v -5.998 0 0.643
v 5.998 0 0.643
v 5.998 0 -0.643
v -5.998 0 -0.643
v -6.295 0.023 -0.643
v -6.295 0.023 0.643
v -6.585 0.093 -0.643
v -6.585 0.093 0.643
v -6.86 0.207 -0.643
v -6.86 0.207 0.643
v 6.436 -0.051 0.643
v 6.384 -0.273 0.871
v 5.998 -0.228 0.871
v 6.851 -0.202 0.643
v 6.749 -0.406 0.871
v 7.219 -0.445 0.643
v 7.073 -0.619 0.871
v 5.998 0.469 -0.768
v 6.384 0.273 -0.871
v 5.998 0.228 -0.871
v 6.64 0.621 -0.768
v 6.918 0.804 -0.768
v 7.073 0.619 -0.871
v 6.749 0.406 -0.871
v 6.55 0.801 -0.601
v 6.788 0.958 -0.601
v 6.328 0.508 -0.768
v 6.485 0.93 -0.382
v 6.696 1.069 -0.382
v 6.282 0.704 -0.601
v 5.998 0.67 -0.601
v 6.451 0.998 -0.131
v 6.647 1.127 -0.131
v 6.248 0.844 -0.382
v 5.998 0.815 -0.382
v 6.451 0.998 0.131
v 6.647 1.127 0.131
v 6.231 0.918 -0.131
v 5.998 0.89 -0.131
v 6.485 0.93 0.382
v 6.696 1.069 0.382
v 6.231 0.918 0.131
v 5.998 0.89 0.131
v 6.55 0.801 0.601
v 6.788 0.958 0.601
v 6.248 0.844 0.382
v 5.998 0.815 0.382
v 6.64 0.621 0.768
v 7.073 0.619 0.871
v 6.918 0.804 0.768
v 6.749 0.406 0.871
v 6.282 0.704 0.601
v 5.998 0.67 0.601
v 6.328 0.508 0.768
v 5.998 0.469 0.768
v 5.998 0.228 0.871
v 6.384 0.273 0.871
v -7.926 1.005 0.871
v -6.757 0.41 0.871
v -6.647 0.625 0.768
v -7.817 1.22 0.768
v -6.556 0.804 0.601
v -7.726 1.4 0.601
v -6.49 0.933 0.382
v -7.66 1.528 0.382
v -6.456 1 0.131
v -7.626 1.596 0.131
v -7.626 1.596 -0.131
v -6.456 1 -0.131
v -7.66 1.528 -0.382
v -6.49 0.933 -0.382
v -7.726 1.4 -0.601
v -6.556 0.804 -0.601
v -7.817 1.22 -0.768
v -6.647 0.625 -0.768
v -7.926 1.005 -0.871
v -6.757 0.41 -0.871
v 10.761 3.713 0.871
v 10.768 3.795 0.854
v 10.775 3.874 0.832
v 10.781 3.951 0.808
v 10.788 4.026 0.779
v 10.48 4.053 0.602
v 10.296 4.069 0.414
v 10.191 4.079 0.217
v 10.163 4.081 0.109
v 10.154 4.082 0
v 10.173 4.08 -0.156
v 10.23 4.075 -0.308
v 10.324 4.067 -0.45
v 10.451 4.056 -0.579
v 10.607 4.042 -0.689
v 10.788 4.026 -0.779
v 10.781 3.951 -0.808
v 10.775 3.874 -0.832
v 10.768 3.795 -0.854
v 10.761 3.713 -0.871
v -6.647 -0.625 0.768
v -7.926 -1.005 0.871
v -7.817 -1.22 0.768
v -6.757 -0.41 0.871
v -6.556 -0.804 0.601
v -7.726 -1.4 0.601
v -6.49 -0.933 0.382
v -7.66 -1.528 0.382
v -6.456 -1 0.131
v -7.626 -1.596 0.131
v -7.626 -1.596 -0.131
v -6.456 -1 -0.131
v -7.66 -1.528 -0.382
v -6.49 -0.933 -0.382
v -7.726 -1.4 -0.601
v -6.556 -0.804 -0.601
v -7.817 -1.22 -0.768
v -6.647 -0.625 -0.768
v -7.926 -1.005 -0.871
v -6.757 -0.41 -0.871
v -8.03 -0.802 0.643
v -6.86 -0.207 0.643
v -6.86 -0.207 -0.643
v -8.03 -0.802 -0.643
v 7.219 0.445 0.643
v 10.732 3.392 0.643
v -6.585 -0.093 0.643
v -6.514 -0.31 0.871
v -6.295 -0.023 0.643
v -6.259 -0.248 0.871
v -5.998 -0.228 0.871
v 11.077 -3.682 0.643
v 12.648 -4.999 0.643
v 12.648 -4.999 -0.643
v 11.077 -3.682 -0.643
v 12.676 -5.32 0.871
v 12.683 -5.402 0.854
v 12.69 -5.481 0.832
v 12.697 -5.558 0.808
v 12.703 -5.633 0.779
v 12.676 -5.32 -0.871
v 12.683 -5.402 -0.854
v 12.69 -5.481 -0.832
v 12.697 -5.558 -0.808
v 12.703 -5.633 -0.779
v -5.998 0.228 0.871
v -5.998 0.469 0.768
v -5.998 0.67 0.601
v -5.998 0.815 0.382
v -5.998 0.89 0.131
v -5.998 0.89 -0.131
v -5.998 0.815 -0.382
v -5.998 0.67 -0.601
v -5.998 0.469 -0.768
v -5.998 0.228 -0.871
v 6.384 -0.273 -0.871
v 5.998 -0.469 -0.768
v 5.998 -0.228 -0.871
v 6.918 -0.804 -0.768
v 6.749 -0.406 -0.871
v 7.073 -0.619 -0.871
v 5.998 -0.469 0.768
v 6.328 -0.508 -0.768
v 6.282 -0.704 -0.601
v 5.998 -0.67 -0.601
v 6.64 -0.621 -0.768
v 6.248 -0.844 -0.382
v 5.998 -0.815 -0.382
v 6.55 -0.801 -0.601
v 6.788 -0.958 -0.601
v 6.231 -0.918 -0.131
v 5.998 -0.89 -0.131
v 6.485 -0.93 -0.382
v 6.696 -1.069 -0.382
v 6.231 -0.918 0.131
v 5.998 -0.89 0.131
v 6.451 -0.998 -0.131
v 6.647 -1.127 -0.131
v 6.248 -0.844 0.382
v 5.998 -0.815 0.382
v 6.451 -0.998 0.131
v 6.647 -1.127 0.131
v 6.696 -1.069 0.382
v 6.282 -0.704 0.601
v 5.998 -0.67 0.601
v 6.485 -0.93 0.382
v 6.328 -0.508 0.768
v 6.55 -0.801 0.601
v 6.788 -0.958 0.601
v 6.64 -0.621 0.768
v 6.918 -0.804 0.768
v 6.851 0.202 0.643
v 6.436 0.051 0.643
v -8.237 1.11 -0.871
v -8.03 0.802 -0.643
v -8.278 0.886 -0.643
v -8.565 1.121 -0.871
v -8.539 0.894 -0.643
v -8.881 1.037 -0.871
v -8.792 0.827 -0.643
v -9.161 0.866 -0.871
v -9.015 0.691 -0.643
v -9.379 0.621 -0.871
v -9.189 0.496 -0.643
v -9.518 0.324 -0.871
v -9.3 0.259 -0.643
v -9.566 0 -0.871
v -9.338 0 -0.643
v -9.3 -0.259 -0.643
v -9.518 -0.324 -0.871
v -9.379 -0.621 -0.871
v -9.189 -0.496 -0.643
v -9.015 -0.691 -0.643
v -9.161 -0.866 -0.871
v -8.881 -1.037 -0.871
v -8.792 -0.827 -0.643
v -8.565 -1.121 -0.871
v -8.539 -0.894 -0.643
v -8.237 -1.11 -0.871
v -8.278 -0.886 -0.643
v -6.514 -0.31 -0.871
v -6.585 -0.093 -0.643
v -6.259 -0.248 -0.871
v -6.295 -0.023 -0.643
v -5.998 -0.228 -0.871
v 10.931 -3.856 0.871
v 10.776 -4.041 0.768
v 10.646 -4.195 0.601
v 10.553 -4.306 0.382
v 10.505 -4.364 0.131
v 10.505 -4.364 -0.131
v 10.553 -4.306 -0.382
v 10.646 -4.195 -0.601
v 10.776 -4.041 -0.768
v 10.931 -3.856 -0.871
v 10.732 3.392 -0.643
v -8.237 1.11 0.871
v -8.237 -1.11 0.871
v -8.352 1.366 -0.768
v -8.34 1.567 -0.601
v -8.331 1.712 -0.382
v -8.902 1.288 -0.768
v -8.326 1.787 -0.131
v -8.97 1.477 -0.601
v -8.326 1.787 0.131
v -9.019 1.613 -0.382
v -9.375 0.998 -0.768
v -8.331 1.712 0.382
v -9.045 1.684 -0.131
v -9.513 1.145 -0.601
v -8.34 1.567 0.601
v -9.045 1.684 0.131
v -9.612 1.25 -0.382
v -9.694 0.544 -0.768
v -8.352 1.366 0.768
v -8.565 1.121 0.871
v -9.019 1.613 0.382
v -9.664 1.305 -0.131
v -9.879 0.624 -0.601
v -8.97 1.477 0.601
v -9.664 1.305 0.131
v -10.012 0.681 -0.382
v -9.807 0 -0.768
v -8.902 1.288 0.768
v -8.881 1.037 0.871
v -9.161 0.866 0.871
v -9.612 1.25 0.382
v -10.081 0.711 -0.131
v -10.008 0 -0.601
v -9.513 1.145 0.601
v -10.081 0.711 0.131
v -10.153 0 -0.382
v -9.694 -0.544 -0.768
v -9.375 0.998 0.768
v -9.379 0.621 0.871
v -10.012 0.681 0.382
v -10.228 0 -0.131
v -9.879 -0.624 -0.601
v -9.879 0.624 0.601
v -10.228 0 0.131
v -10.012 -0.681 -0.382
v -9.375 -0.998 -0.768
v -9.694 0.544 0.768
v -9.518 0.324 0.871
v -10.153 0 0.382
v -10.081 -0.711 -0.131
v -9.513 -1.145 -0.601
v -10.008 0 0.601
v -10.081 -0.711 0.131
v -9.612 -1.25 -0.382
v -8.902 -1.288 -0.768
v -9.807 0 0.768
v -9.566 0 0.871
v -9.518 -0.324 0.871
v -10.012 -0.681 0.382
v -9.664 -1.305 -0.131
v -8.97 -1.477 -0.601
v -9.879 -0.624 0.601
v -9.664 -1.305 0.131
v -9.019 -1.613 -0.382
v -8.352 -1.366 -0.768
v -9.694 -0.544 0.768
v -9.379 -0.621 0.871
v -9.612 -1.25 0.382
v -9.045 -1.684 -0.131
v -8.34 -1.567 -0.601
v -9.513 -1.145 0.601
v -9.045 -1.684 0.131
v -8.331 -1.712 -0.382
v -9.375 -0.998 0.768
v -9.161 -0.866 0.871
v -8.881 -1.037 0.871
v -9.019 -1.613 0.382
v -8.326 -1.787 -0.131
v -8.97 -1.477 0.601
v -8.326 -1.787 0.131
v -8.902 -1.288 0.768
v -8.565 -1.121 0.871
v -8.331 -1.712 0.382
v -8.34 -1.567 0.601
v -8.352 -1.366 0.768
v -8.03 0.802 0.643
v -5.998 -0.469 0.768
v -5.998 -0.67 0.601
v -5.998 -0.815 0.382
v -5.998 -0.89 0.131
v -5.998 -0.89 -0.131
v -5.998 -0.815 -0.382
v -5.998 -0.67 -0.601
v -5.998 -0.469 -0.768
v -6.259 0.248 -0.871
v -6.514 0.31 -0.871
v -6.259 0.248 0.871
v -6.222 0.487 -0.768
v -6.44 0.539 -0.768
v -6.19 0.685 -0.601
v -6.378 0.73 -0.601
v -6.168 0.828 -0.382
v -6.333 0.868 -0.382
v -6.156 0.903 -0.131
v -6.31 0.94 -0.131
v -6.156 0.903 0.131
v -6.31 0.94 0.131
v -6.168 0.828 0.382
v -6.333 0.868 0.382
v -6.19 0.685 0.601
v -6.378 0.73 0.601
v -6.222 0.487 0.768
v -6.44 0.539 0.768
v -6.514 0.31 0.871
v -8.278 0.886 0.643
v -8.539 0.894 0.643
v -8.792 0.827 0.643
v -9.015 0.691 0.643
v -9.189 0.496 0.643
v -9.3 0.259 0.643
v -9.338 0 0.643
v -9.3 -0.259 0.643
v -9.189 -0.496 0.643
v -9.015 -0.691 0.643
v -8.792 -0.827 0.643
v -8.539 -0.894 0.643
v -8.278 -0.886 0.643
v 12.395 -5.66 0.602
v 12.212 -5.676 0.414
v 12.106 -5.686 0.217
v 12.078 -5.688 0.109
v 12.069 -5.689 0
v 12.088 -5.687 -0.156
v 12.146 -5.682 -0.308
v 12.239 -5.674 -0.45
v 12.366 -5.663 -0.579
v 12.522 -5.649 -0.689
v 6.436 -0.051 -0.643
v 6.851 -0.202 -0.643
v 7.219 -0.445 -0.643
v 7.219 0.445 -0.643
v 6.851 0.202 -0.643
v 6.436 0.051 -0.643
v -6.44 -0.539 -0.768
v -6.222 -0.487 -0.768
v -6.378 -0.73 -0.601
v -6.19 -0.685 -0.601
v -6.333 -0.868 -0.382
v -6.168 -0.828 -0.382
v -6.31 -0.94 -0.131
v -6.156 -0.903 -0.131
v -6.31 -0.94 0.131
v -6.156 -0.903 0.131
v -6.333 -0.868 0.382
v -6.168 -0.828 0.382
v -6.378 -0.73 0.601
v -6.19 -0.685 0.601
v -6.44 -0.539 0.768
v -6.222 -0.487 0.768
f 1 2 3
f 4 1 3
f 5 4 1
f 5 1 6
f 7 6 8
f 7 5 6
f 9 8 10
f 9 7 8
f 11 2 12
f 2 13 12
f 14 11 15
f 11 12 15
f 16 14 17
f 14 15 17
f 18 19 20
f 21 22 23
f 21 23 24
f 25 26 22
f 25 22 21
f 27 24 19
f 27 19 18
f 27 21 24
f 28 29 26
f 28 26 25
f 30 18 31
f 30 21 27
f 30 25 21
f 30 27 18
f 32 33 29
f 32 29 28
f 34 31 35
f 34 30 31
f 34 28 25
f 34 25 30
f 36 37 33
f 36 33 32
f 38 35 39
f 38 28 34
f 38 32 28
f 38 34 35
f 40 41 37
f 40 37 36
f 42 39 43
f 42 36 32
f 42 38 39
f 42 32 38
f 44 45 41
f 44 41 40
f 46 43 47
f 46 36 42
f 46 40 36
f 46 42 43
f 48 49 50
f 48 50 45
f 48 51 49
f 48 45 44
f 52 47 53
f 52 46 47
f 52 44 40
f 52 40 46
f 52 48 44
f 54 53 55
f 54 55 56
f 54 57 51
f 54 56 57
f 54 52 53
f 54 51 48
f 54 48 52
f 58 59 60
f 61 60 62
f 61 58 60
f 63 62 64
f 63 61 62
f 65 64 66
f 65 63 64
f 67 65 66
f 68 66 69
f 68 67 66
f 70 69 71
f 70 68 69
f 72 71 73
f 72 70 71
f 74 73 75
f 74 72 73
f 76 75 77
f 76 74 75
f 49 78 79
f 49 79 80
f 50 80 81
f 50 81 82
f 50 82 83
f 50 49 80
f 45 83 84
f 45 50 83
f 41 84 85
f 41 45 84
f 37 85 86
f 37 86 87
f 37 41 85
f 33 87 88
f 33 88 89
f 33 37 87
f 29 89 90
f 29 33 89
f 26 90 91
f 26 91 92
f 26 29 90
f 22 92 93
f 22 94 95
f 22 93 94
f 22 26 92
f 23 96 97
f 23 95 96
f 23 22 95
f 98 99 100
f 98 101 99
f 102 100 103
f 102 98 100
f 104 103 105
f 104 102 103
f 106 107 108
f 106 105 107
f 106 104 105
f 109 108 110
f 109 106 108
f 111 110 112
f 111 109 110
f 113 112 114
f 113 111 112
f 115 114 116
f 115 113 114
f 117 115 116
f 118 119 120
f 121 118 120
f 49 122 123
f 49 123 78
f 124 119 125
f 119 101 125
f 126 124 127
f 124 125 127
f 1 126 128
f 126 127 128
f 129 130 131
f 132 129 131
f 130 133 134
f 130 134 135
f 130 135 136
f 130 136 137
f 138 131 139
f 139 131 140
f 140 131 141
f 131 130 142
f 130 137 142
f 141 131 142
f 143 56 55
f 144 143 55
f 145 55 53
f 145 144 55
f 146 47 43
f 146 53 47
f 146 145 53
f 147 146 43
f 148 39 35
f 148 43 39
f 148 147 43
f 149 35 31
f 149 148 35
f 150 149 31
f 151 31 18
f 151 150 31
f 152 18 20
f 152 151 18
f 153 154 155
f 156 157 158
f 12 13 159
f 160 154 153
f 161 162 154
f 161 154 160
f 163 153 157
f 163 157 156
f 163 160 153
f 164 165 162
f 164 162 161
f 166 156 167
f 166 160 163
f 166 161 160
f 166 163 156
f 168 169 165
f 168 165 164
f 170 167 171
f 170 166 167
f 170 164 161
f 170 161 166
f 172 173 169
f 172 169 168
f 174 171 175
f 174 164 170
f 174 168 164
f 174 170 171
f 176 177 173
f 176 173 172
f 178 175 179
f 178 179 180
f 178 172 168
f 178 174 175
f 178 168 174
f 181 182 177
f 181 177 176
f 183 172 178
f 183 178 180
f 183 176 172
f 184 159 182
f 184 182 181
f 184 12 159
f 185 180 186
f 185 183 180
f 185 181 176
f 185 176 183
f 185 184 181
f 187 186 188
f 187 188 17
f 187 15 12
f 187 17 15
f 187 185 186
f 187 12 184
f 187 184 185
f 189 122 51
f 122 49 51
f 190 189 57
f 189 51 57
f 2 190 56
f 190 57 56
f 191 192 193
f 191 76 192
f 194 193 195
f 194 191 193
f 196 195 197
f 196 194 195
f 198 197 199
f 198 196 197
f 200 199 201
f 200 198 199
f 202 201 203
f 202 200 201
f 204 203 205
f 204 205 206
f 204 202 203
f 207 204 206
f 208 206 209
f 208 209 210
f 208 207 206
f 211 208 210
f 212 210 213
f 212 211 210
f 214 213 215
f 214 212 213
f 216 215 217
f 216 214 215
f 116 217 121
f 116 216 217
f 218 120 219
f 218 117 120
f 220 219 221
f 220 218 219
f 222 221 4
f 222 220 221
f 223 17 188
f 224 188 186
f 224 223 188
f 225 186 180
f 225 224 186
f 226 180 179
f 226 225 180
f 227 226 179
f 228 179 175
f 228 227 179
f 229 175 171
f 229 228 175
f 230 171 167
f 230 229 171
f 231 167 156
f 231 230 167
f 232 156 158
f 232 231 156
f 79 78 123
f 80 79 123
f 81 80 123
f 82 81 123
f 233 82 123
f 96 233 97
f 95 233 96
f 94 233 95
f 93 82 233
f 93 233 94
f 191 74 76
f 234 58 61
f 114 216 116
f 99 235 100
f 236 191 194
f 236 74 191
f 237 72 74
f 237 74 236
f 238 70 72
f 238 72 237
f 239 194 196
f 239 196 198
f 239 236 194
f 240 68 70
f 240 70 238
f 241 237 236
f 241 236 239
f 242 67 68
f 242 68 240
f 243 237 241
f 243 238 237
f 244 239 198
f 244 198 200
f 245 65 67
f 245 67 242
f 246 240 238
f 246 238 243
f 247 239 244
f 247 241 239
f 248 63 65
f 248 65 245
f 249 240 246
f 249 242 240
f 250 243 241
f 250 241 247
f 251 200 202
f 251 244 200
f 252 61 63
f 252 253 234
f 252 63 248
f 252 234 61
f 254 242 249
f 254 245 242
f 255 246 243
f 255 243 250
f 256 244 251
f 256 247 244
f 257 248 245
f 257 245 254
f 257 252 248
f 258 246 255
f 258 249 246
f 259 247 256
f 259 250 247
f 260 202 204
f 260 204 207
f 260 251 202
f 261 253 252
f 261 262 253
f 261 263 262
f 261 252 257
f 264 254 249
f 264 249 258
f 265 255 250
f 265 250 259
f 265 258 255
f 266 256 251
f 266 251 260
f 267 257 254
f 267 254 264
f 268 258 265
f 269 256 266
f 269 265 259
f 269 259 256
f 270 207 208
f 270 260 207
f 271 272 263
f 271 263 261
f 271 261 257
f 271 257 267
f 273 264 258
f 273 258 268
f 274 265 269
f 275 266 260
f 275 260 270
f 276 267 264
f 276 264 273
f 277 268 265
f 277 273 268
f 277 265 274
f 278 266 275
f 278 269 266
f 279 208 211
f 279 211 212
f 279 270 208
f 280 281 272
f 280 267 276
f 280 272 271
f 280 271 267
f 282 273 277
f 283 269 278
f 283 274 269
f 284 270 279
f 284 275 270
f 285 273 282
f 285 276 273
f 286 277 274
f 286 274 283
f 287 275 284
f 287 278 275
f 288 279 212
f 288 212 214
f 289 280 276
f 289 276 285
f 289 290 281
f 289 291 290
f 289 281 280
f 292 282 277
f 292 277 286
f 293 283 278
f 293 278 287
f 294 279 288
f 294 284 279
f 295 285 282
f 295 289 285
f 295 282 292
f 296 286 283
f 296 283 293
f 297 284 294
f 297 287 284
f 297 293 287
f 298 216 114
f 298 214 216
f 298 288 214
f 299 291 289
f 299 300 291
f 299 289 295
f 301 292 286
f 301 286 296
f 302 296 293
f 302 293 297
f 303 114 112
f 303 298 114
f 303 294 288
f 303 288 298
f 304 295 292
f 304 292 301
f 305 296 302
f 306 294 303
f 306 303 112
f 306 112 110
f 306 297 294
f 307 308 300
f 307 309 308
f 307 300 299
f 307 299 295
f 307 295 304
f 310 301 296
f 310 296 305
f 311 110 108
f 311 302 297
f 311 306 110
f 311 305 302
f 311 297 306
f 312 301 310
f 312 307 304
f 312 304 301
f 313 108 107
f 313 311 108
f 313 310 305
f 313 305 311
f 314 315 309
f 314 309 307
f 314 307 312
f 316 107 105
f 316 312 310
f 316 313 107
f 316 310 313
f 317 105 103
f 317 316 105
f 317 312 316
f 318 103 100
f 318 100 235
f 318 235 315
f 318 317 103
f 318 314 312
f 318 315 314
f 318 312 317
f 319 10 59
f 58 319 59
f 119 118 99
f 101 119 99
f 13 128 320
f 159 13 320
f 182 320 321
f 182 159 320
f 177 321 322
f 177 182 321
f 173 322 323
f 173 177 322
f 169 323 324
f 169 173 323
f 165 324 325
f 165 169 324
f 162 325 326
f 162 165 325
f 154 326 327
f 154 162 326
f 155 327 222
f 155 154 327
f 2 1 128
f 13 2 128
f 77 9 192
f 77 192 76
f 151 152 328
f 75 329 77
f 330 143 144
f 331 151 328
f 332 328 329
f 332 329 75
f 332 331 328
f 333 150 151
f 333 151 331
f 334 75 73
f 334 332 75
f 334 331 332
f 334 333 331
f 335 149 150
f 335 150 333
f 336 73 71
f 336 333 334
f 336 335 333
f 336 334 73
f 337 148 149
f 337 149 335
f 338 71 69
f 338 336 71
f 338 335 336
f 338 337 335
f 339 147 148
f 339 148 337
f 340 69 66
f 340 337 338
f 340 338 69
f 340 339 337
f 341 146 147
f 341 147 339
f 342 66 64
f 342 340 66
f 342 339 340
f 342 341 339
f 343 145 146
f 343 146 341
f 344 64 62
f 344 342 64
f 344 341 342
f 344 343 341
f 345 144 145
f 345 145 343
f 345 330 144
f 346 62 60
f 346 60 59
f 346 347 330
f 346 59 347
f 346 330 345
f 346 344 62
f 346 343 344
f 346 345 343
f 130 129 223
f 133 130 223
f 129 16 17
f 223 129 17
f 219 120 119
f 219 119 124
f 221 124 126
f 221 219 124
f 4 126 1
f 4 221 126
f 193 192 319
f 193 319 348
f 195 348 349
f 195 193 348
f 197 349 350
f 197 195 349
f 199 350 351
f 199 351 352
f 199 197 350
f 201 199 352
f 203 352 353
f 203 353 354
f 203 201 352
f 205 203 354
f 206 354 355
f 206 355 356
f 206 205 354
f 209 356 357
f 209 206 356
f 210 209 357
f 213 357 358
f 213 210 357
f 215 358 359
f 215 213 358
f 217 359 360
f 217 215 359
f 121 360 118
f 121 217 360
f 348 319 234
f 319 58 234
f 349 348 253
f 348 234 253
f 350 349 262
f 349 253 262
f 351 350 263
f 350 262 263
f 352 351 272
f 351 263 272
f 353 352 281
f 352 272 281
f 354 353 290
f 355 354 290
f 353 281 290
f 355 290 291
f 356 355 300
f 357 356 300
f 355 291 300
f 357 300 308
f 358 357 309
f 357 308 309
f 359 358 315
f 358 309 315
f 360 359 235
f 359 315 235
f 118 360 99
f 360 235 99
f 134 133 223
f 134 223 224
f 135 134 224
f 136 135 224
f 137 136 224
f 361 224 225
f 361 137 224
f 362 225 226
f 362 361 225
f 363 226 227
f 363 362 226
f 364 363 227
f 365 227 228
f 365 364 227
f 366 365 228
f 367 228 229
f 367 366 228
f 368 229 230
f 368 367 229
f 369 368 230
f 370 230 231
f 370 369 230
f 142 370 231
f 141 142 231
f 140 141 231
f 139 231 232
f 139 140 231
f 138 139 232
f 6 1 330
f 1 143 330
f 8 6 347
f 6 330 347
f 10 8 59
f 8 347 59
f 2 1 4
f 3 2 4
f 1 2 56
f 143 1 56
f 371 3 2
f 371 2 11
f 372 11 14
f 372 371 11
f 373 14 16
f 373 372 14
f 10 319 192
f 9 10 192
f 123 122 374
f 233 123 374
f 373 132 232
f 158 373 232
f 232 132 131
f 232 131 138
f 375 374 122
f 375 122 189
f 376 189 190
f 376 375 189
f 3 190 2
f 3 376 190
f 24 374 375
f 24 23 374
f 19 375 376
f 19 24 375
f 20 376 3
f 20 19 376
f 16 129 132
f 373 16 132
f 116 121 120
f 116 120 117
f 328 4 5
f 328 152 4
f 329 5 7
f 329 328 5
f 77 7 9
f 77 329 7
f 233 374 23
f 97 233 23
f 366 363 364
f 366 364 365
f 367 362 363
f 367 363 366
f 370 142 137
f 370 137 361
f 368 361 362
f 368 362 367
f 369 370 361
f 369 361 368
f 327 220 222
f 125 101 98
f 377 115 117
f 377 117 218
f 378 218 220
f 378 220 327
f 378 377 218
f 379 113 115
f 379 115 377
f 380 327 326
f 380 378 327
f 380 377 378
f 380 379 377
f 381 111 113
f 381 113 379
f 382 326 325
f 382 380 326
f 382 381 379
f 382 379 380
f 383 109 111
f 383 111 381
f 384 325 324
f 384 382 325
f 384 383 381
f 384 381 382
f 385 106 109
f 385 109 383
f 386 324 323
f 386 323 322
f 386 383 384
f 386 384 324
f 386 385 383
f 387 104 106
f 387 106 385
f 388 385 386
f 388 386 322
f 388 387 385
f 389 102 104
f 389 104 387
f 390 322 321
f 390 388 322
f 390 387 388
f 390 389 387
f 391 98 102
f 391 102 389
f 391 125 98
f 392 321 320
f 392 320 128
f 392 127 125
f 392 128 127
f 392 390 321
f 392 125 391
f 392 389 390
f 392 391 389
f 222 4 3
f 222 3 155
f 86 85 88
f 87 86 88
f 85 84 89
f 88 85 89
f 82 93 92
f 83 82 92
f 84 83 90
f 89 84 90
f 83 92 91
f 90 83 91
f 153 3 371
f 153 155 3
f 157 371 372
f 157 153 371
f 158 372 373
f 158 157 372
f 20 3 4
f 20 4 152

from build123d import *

# Parameters (mm, degrees)
ZKOSIT1_SIZE                  = 0.257142857
ZKOSIT2_SIZE                  = 0.45
ODEBRAT_VYSUNUT_M2_DEPTH      = 10
ODEBRAT_VYSUNUT_M2_DEPTH_BACK = 10
ODEBRAT_VYSUNUT_M3_DEPTH      = 15.066370457
ODEBRAT_VYSUNUT_M3_DEPTH_BACK = 15.066370457


with BuildPart() as part:
    # Táhnout po křivce1: sweep along a path in Skica1
    with BuildLine(Plane.XY) as t_hnout_po_k_ivce1_path:
        Line((10.498702419, 4.371053092), (6.640879802, 1.133955557))
        ThreePointArc((6.640879802, 1.133955557), (6.340112335, 0.960307379), (5.998092192, 0.9))
        Line((5.998092192, 0.9), (-5.998092192, 0.9))
        ThreePointArc((-5.998092192, 0.9), (-6.231322977, 0.927578589), (-6.451689409, 1.008793198))
        Line((-6.451689409, 1.008793198), (-7.621462583, 1.604172244))
        ThreePointArc((-7.621462583, 1.604172244), (-10.237937574, 0), (-7.621462583, -1.604172244))
        Line((-7.621462583, -1.604172244), (-6.451689409, -1.008793198))
        ThreePointArc((-6.451689409, -1.008793198), (-6.231322977, -0.927578589), (-5.998092192, -0.9))
        Line((-5.998092192, -0.9), (5.998092192, -0.9))
        ThreePointArc((5.998092192, -0.9), (6.340112335, -0.960307379), (6.640879802, -1.133955557))
        Line((6.640879802, -1.133955557), (10.498702419, -4.371053092))
        Line((10.498702419, -4.371053092), (12.413813527, -5.978022117))
    # Skica2 → Táhnout po křivce1 (sweep)
    with BuildSketch(Plane(origin=(10.498702419, 4.371053092, 0), x_dir=(0, 0, -1), z_dir=(0.7660444431189762, 0.6427876096865417, 0))):
        with BuildLine():
            Line((0.9, -0.9), (-0.9, -0.9))
            ThreePointArc((-0.9, -0.9), (0, 0), (0.9, -0.9))
        make_face()
    sweep(path=t_hnout_po_k_ivce1_path.line)

    # Zkosit1
    # the kernel refuses this chamfer: 0.257142857 mm, written as the material it takes off along each edge
    with BuildSketch(Plane(origin=(5.998092192, 0, 0.9), x_dir=(0, 0, -1), z_dir=(-1, 0, 0)), Plane(origin=(-5.998092192, 0, 0.9), x_dir=(0, 0, -1), z_dir=(1, 0, 0))) as zkosit1_piece_1:
        with BuildLine():
            Line((ZKOSIT1_SIZE, 0), (0.029314045, -0.227828812))
            ThreePointArc((0.029314045, -0.227828812), (0.007766605, -0.117981219), (0, 0))
            Line((0, 0), (ZKOSIT1_SIZE, 0))
        make_face()
    extrude(amount=11.996184384, mode=Mode.SUBTRACT)
    with BuildSketch(Plane(origin=(5.998092192, 0, -0.9), x_dir=(0, 0, 1), z_dir=(-1, 0, 0)), Plane(origin=(-5.998092192, 0, -0.9), x_dir=(0, 0, 1), z_dir=(1, 0, 0))) as zkosit1_piece_2:
        with BuildLine():
            Line((ZKOSIT1_SIZE, 0), (0.029314045, 0.227828812))
            ThreePointArc((0.029314045, 0.227828812), (0.007766605, 0.117981219), (0, 0))
            Line((0, 0), (ZKOSIT1_SIZE, 0))
        make_face()
    extrude(amount=11.996184384, mode=Mode.SUBTRACT)
    with BuildSketch(Plane(origin=(-5.998092192, 1.9, 0.9), x_dir=(0, -1, 0), z_dir=(1, 0, 0))) as zkosit1_piece_3:
        with BuildLine():
            Line((1.9, ZKOSIT1_SIZE), (1.672171188, 0.029314045))
            ThreePointArc((1.672171188, 0.029314045), (1.782018781, 0.007766605), (1.9, 0))
            Line((1.9, 0), (1.9, ZKOSIT1_SIZE))
        make_face()
    revolve(axis=Axis((-5.998092192, 1.9, 0.9), (0, 0, -1)), revolution_arc=26.974712985, mode=Mode.SUBTRACT)
    with BuildSketch(Plane(origin=(-5.998092192, 1.9, -0.9), x_dir=(0, -1, 0), z_dir=(1, 0, 0))) as zkosit1_piece_4:
        with BuildLine():
            Line((1.9, -ZKOSIT1_SIZE), (1.672171188, -0.029314045))
            ThreePointArc((1.672171188, -0.029314045), (1.782018781, -0.007766605), (1.9, 0))
            Line((1.9, 0), (1.9, -ZKOSIT1_SIZE))
        make_face()
    revolve(axis=Axis((-5.998092192, 1.9, -0.9), (0, 0, -1)), revolution_arc=26.974712985, mode=Mode.SUBTRACT)
    with BuildSketch(Plane(origin=(-6.859926905, 0.206707076, 0.9), x_dir=(0, 0, -1), z_dir=(-0.8912068023322748, 0.4535972172276652, 0)), Plane(origin=(-8.029700078, -0.802086122, 0.9), x_dir=(0, 0, -1), z_dir=(0.8912068023322748, 0.45359721722766544, 0))) as zkosit1_piece_5:
        with BuildLine():
            Line((ZKOSIT1_SIZE, 0), (0.029314045, -0.227828812))
            ThreePointArc((0.029314045, -0.227828812), (0.007766605, -0.117981219), (0, 0))
            Line((0, 0), (ZKOSIT1_SIZE, 0))
        make_face()
    extrude(amount=1.312572088, mode=Mode.SUBTRACT)
    with BuildSketch(Plane(origin=(-6.859926905, 0.206707076, -0.9), x_dir=(0, 0, 1), z_dir=(-0.8912068023322748, 0.4535972172276652, 0)), Plane(origin=(-8.029700078, -0.802086122, -0.9), x_dir=(0, 0, 1), z_dir=(0.8912068023322748, 0.45359721722766544, 0))) as zkosit1_piece_6:
        with BuildLine():
            Line((ZKOSIT1_SIZE, 0), (0.029314045, 0.227828812))
            ThreePointArc((0.029314045, 0.227828812), (0.007766605, 0.117981219), (0, 0))
            Line((0, 0), (ZKOSIT1_SIZE, 0))
        make_face()
    extrude(amount=1.312572088, mode=Mode.SUBTRACT)
    with BuildSketch(Plane(origin=(-8.437937574, 0, 0.9), x_dir=(0.4535972172277306, 0.8912068023322415, 0), z_dir=(0.8912068023322415, -0.4535972172277306, 0))) as zkosit1_piece_7:
        with BuildLine():
            Line((0.9, -ZKOSIT1_SIZE), (1.127828812, -0.029314045))
            ThreePointArc((1.127828812, -0.029314045), (1.017981219, -0.007766605), (0.9, 0))
            Line((0.9, 0), (0.9, -ZKOSIT1_SIZE))
        make_face()
    revolve(axis=Axis((-8.437937574, 0, 0.9), (0, 0, 1)), revolution_arc=233.94942597, mode=Mode.SUBTRACT)
    with BuildSketch(Plane(origin=(-8.437937574, 0, -0.9), x_dir=(0.4535972172277306, 0.8912068023322415, 0), z_dir=(0.8912068023322415, -0.4535972172277306, 0))) as zkosit1_piece_8:
        with BuildLine():
            Line((0.9, ZKOSIT1_SIZE), (1.127828812, 0.029314045))
            ThreePointArc((1.127828812, 0.029314045), (1.017981219, 0.007766605), (0.9, 0))
            Line((0.9, 0), (0.9, ZKOSIT1_SIZE))
        make_face()
    revolve(axis=Axis((-8.437937574, 0, -0.9), (0, 0, 1)), revolution_arc=233.94942597, mode=Mode.SUBTRACT)
    with BuildSketch(Plane(origin=(-5.998092192, -1.9, 0.9), x_dir=(-0.4535972172277067, 0.8912068023322537, 0), z_dir=(-0.8912068023322537, -0.4535972172277067, 0))) as zkosit1_piece_9:
        with BuildLine():
            Line((1.9, ZKOSIT1_SIZE), (1.672171188, 0.029314045))
            ThreePointArc((1.672171188, 0.029314045), (1.782018781, 0.007766605), (1.9, 0))
            Line((1.9, 0), (1.9, ZKOSIT1_SIZE))
        make_face()
    revolve(axis=Axis((-5.998092192, -1.9, 0.9), (0, 0, -1)), revolution_arc=26.974712985, mode=Mode.SUBTRACT)
    with BuildSketch(Plane(origin=(-5.998092192, -1.9, -0.9), x_dir=(-0.4535972172277067, 0.8912068023322537, 0), z_dir=(-0.8912068023322537, -0.4535972172277067, 0))) as zkosit1_piece_10:
        with BuildLine():
            Line((1.9, -ZKOSIT1_SIZE), (1.672171188, -0.029314045))
            ThreePointArc((1.672171188, -0.029314045), (1.782018781, -0.007766605), (1.9, 0))
            Line((1.9, 0), (1.9, -ZKOSIT1_SIZE))
        make_face()
    revolve(axis=Axis((-5.998092192, -1.9, -0.9), (0, 0, -1)), revolution_arc=26.974712985, mode=Mode.SUBTRACT)
    with BuildSketch(Plane(origin=(5.998092192, -1.9, 0.9), x_dir=(0, 1, 0), z_dir=(-1, 0, 0))) as zkosit1_piece_11:
        with BuildLine():
            Line((1.9, ZKOSIT1_SIZE), (1.672171188, 0.029314045))
            ThreePointArc((1.672171188, 0.029314045), (1.782018781, 0.007766605), (1.9, 0))
            Line((1.9, 0), (1.9, ZKOSIT1_SIZE))
        make_face()
    revolve(axis=Axis((5.998092192, -1.9, 0.9), (0, 0, -1)), revolution_arc=40, mode=Mode.SUBTRACT)
    with BuildSketch(Plane(origin=(5.998092192, -1.9, -0.9), x_dir=(0, 1, 0), z_dir=(-1, 0, 0))) as zkosit1_piece_12:
        with BuildLine():
            Line((1.9, -ZKOSIT1_SIZE), (1.672171188, -0.029314045))
            ThreePointArc((1.672171188, -0.029314045), (1.782018781, -0.007766605), (1.9, 0))
            Line((1.9, 0), (1.9, -ZKOSIT1_SIZE))
        make_face()
    revolve(axis=Axis((5.998092192, -1.9, -0.9), (0, 0, -1)), revolution_arc=40, mode=Mode.SUBTRACT)
    with BuildSketch(Plane(origin=(7.21938865, -0.444515558, 0.9), x_dir=(0, 0, -1), z_dir=(0.7660444431189773, -0.6427876096865403, 0)), Plane(origin=(13.498899837, -5.713651079, -0.9), x_dir=(0, 0, 1), z_dir=(-0.7660444431189773, 0.6427876096865401, 0))) as zkosit1_piece_13:
        with BuildLine():
            Line((ZKOSIT1_SIZE, 0), (0.029314045, -0.227828812))
            ThreePointArc((0.029314045, -0.227828812), (0.007766605, -0.117981219), (0, 0))
            Line((0, 0), (ZKOSIT1_SIZE, 0))
        make_face()
    extrude(amount=8.197319677, mode=Mode.SUBTRACT)
    with BuildSketch(Plane(origin=(11.58378873, 4.106682055, -0.9), x_dir=(0, 0, 1), z_dir=(-0.766044443118977, -0.6427876096865406, 0))) as zkosit1_piece_14:
        with BuildLine():
            Line((ZKOSIT1_SIZE, 0), (0.029314045, 0.227828812))
            ThreePointArc((0.029314045, 0.227828812), (0.007766605, 0.117981219), (0, 0))
            Line((0, 0), (ZKOSIT1_SIZE, 0))
        make_face()
    extrude(amount=5.697319677, mode=Mode.SUBTRACT)
    with BuildSketch(Plane(origin=(11.58378873, 4.106682055, 0.9), x_dir=(0, 0, -1), z_dir=(-0.766044443118977, -0.6427876096865406, 0))) as zkosit1_piece_15:
        with BuildLine():
            Line((ZKOSIT1_SIZE, 0), (0.029314045, -0.227828812))
            ThreePointArc((0.029314045, -0.227828812), (0.007766605, -0.117981219), (0, 0))
            Line((0, 0), (ZKOSIT1_SIZE, 0))
        make_face()
    extrude(amount=5.697319677, mode=Mode.SUBTRACT)
    with BuildSketch(Plane(origin=(5.998092192, 1.9, 0.9), x_dir=(0.6427876096865431, -0.7660444431189749, 0), z_dir=(0.7660444431189749, 0.6427876096865431, 0))) as zkosit1_piece_16:
        with BuildLine():
            Line((1.9, ZKOSIT1_SIZE), (1.672171188, 0.029314045))
            ThreePointArc((1.672171188, 0.029314045), (1.782018781, 0.007766605), (1.9, 0))
            Line((1.9, 0), (1.9, ZKOSIT1_SIZE))
        make_face()
    revolve(axis=Axis((5.998092192, 1.9, 0.9), (0, 0, -1)), revolution_arc=40, mode=Mode.SUBTRACT)
    with BuildSketch(Plane(origin=(5.998092192, 1.9, -0.9), x_dir=(0.6427876096865431, -0.7660444431189749, 0), z_dir=(0.7660444431189749, 0.6427876096865431, 0))) as zkosit1_piece_17:
        with BuildLine():
            Line((1.9, -ZKOSIT1_SIZE), (1.672171188, -0.029314045))
            ThreePointArc((1.672171188, -0.029314045), (1.782018781, -0.007766605), (1.9, 0))
            Line((1.9, 0), (1.9, -ZKOSIT1_SIZE))
        make_face()
    revolve(axis=Axis((5.998092192, 1.9, -0.9), (0, 0, -1)), revolution_arc=40, mode=Mode.SUBTRACT)

    # Zkosit2
    zkosit2_edges = [part.edges().sort_by_distance(p)[0] for p in [
        (12.992322376, -5.288582118, 0),
        (11.077211268, 3.681613094, 0),
    ]]
    chamfer(zkosit2_edges, length=ZKOSIT2_SIZE)

    # Skica5 → Odebrat vysunutím2 (cut, two sides: drawn at the far end of the back side and taken through both)
    with BuildSketch(Plane.XY.offset(-ODEBRAT_VYSUNUT_M2_DEPTH_BACK)):
        Polygon((10.787956844, 4.026333093), (10.15398242, 4.081798668), (10.498702419, 4.371053092), align=None)
    extrude(amount=ODEBRAT_VYSUNUT_M2_DEPTH + ODEBRAT_VYSUNUT_M2_DEPTH_BACK, mode=Mode.SUBTRACT)

    # Skica6 → Odebrat vysunutím3 (cut, two sides: drawn at the far end of the back side and taken through both)
    with BuildSketch(Plane.XY.offset(-ODEBRAT_VYSUNUT_M3_DEPTH_BACK)):
        Polygon((12.703067951, -5.633302117), (12.069093528, -5.688767692), (12.413813527, -5.978022117), align=None)
    extrude(amount=ODEBRAT_VYSUNUT_M3_DEPTH + ODEBRAT_VYSUNUT_M3_DEPTH_BACK, mode=Mode.SUBTRACT)


solid = part.part
